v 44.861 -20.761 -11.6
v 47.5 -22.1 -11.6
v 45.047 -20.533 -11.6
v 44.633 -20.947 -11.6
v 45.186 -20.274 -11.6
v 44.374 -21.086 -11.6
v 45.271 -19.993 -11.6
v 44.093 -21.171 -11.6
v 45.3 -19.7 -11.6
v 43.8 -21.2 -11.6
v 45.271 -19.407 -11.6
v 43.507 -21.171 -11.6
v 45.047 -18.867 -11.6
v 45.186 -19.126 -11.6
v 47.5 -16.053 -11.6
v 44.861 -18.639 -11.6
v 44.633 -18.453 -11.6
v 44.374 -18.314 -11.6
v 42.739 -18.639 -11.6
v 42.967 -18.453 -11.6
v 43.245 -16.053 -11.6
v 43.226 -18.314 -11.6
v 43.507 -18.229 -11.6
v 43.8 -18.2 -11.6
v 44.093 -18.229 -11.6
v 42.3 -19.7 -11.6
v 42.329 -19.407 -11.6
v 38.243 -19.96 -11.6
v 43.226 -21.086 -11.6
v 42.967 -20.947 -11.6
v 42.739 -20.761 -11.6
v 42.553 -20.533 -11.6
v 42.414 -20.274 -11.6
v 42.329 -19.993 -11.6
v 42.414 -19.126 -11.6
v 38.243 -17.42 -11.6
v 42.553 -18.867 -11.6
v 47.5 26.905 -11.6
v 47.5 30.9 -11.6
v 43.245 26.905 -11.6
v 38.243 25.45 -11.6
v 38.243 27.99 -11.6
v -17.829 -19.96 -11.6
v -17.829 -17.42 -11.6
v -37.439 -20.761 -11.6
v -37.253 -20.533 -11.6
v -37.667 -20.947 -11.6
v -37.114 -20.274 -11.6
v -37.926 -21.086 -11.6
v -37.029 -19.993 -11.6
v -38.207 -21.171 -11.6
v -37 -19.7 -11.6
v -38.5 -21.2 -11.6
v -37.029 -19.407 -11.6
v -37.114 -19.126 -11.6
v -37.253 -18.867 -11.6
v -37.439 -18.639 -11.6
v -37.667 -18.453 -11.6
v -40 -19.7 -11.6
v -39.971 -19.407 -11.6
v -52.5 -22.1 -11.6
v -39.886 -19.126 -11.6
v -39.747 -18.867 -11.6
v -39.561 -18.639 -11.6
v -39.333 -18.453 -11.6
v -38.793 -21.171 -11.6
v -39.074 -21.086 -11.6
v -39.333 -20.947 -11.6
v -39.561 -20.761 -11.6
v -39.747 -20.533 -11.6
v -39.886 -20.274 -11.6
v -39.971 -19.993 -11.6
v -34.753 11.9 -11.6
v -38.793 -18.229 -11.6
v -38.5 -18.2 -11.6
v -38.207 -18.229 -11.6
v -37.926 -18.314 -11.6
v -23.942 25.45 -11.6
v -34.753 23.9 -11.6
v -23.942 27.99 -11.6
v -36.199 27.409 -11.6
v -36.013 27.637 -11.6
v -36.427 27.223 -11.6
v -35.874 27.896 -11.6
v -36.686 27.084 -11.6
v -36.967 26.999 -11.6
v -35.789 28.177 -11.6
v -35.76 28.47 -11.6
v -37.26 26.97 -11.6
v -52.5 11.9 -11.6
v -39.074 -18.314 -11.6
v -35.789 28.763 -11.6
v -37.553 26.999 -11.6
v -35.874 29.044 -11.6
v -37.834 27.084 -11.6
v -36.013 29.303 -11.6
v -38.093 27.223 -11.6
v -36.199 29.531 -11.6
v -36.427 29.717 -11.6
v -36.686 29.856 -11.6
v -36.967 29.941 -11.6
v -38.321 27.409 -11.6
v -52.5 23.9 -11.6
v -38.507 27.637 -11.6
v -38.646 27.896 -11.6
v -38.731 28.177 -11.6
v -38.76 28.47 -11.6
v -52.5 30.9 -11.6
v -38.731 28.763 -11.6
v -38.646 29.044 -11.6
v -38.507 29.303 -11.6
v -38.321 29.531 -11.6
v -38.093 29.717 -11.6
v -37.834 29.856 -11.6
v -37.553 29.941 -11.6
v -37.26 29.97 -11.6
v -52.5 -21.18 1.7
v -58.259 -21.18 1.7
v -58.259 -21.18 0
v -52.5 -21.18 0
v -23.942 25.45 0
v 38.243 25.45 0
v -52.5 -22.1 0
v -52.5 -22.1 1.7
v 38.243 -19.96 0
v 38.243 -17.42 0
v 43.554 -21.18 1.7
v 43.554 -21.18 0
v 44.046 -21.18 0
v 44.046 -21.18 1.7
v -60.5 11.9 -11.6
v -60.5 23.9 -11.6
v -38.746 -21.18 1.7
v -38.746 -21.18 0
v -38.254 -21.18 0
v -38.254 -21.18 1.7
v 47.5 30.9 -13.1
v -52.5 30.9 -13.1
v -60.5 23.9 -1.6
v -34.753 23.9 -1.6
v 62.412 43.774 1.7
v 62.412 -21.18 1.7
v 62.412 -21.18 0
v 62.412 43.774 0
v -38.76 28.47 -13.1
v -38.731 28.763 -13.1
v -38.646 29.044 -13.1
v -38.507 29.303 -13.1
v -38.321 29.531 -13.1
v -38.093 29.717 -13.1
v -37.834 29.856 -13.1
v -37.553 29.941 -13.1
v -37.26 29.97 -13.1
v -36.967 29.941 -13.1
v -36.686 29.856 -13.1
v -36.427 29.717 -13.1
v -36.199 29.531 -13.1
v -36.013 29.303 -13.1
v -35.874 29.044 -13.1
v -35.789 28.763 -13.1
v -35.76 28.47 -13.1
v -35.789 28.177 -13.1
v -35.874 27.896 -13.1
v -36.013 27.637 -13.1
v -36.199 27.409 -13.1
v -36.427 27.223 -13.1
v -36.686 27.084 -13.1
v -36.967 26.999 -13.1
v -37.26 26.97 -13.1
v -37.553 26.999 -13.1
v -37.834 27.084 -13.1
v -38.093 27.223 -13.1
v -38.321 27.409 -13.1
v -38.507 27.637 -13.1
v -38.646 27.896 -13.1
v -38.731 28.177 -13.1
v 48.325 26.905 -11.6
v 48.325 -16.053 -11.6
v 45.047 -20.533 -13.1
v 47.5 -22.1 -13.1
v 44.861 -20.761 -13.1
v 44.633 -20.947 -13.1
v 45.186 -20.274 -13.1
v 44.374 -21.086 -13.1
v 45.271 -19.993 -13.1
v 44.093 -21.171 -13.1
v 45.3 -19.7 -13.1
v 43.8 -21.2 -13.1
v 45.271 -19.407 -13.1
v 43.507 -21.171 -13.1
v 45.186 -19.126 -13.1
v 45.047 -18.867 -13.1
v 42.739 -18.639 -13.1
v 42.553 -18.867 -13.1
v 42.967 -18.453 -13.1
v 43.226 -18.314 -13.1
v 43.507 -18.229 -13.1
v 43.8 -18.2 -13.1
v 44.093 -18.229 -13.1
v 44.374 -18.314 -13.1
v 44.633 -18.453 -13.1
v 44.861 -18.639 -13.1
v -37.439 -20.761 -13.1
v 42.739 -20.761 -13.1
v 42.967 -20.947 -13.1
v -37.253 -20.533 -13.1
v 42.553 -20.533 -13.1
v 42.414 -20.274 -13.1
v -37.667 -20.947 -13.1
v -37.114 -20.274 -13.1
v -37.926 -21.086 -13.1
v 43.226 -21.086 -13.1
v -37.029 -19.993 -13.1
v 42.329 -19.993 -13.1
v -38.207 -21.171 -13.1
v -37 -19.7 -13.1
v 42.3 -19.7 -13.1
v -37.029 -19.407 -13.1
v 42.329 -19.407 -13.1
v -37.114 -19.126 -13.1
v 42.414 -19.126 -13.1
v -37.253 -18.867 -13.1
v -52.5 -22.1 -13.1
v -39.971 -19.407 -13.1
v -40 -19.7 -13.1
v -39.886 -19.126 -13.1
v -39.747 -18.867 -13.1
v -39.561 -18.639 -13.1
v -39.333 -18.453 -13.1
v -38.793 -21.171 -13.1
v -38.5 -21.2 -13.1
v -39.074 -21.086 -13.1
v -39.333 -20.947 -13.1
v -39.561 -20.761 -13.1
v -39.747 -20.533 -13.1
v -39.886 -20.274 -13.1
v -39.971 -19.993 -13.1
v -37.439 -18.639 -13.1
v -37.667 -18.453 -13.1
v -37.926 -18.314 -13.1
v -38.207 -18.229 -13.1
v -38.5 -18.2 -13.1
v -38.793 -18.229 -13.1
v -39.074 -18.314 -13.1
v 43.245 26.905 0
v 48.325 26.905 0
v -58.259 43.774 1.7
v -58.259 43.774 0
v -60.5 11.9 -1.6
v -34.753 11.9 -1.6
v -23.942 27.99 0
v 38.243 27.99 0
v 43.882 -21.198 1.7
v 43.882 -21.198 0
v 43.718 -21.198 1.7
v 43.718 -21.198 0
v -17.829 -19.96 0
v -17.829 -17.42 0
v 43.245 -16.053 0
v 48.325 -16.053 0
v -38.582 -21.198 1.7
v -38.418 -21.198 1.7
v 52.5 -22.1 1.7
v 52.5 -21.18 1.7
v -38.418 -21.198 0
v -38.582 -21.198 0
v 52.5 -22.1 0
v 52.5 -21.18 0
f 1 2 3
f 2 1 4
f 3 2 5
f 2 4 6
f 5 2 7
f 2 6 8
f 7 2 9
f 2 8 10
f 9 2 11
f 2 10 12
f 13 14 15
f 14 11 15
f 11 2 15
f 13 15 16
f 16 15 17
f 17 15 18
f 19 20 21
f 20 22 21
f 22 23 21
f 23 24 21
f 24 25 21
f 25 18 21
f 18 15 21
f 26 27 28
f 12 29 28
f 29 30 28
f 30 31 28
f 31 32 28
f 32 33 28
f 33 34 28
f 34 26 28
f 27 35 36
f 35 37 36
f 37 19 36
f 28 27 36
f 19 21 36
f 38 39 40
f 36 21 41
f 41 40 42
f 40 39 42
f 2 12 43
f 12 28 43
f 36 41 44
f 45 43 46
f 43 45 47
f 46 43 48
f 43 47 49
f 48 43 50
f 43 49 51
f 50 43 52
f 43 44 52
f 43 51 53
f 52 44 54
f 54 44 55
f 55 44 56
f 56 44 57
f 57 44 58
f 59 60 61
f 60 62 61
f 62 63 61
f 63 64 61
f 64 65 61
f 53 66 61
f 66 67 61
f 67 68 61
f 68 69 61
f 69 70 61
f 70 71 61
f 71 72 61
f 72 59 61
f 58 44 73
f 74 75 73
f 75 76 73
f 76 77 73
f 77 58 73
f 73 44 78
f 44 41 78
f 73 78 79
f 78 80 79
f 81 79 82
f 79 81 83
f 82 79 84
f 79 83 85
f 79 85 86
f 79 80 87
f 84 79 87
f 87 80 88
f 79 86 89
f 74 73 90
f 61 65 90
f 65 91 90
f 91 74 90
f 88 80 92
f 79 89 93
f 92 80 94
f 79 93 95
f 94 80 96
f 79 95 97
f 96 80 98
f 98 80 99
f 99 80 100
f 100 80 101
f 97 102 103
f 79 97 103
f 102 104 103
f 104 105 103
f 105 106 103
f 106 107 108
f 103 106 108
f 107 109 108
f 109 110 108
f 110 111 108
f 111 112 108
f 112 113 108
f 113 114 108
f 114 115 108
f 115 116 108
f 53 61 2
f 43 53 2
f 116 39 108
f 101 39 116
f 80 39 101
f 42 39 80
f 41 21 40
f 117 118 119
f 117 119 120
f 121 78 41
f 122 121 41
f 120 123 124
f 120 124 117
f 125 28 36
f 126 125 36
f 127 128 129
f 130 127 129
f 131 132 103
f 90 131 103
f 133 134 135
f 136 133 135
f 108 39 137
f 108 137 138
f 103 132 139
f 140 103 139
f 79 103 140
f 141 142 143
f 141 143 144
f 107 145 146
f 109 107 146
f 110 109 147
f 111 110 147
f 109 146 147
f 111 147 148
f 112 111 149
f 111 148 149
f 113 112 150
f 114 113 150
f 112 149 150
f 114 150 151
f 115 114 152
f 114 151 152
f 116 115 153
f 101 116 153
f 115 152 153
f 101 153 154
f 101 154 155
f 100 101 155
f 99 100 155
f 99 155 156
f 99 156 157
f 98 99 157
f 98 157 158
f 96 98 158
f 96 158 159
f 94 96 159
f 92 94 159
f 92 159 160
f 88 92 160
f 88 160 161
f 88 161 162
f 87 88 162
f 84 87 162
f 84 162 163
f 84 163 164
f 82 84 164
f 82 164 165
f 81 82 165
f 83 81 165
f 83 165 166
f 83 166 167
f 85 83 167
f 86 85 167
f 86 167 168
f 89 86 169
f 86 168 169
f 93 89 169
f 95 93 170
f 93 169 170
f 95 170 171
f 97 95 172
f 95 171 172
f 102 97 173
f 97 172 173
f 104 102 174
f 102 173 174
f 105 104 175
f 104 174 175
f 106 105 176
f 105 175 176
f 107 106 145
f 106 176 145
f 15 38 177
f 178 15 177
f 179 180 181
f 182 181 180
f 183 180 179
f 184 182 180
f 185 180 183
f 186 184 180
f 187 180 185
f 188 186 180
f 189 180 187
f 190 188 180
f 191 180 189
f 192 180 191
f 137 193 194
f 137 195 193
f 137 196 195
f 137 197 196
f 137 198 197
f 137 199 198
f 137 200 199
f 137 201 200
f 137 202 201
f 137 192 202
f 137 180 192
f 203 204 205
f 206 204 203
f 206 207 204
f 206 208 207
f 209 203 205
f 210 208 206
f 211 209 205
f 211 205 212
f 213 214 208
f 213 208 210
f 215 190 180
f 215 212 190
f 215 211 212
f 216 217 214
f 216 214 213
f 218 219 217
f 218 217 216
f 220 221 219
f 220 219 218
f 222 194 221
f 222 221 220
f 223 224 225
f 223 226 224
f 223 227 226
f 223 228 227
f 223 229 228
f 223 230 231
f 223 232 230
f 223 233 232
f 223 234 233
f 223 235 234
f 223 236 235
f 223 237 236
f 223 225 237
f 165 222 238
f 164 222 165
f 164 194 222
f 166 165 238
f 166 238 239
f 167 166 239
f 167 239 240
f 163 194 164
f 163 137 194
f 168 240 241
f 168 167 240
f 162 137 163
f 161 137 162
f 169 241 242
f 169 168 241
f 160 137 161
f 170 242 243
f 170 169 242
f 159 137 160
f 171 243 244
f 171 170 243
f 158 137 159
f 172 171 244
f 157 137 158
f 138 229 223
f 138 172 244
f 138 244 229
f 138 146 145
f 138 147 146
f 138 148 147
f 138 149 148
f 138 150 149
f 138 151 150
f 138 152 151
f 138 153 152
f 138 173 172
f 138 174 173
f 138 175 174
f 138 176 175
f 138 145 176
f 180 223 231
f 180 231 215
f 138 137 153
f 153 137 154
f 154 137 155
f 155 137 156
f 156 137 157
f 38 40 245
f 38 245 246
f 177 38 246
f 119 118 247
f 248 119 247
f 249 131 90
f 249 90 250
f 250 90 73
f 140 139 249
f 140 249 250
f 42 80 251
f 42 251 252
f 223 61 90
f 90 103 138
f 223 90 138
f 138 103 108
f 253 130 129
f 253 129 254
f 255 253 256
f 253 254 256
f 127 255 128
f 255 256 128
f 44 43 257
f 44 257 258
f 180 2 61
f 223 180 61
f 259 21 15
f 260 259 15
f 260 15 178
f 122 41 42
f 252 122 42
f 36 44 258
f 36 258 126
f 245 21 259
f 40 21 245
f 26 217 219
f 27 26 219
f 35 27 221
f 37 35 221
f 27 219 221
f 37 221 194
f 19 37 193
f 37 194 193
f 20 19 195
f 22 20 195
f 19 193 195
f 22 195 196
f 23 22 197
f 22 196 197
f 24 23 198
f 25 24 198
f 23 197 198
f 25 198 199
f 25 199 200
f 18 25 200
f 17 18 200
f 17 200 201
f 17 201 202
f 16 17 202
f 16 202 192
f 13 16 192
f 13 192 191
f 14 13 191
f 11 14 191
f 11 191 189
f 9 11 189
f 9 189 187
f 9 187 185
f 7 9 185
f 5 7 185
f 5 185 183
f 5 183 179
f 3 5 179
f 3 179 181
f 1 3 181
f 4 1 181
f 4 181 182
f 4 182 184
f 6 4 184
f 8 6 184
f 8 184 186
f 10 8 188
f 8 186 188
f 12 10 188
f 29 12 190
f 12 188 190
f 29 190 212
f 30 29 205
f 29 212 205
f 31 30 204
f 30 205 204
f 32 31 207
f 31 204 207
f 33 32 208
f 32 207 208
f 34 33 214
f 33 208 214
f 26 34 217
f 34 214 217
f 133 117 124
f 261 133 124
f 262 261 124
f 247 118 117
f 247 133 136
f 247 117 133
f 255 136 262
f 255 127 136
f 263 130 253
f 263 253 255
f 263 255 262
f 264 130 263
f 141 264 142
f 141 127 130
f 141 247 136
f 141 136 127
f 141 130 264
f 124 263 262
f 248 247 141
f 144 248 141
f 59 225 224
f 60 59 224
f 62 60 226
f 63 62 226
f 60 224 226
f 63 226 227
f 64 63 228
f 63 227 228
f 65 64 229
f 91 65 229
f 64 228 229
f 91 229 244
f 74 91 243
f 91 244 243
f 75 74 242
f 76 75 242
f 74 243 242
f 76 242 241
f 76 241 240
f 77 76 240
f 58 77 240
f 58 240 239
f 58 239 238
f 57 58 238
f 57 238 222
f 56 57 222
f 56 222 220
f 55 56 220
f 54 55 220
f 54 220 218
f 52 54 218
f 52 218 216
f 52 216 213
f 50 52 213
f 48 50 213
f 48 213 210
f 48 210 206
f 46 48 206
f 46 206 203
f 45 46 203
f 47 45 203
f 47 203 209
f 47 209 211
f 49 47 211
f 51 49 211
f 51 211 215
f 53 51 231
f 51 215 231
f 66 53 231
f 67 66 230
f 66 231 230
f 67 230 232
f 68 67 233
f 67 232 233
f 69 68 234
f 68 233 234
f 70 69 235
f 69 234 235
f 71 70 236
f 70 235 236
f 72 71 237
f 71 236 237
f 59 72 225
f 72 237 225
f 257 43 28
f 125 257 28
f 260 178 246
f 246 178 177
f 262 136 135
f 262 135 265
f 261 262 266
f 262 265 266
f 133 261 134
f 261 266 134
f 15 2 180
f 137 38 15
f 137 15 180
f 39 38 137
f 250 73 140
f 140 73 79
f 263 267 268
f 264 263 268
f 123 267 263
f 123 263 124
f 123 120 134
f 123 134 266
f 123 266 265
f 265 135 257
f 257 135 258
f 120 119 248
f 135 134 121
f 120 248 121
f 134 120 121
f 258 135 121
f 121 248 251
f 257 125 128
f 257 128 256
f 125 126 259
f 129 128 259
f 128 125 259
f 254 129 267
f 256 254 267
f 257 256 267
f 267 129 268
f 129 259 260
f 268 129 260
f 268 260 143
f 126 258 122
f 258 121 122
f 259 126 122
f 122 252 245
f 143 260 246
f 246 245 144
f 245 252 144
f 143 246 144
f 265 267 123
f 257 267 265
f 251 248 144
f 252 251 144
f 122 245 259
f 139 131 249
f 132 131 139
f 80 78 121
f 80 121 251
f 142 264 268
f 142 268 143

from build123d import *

# Parameters (mm, degrees)
ESBO_O1_W                 = 105
ESBO_O1_H                 = 60
RESSALTO_EXTRUS_O1_DEPTH  = 1.7
RESSALTO_EXTRUS_O6_START  = 11.6
ESBO_O3_W                 = 100
ESBO_O3_H                 = 53
RESSALTO_EXTRUS_O6_DEPTH  = 1.5
ESBO_O4_W                 = 62.184169383
ESBO_O4_H                 = 2.54
ESBO_O4_W_2               = 5.08
ESBO_O4_H_2               = 42.957805244
ESBO_O4_W_3               = 56.07185462
RESSALTO_EXTRUS_O8_DEPTH  = 11.6
ESBO_O7_W                 = 25.746964405
ESBO_O7_H                 = 12
RESSALTO_EXTRUS_O10_DEPTH = 10
ESBO_O8_R                 = 1.5
ESBO_O8_W                 = 105
ESBO_O8_H                 = 7.9
CORTE_EXTRUS_O1_DEPTH     = 15.8
ESBO_O9_W                 = 120.671020404
ESBO_O9_H                 = 64.953228707
RESSALTO_EXTRUS_O11_DEPTH = 1.7


with BuildPart() as part:
    # Esboço1 → Ressalto-extrusão1 (new body)
    with BuildSketch(Plane.XY):
        Rectangle(ESBO_O1_W, ESBO_O1_H)
    extrude(amount=RESSALTO_EXTRUS_O1_DEPTH)



with BuildPart() as body_2:
    # Esboço3 → Ressalto-extrusão6 (new body)
    with BuildSketch(Plane(origin=(0, 0, 0), x_dir=(-1, 0, 0), z_dir=(0, 0, -1)).offset(RESSALTO_EXTRUS_O6_START)):
        with Locations((2.5, 4.4)):
            Rectangle(ESBO_O3_W, ESBO_O3_H)
    extrude(amount=RESSALTO_EXTRUS_O6_DEPTH)


with BuildPart() as part_1:
    add(part.part)

    add(body_2.part)  # Ressalto-extrusão8 merges body 2
    # Esboço4 → Ressalto-extrusão8 (add)
    with BuildSketch(Plane.XY.offset(-11.6)):
        with Locations((7.150543675, 26.719832293)):
            Rectangle(ESBO_O4_W, ESBO_O4_H)
        with Locations((45.784919315, 5.42627648)):
            Rectangle(ESBO_O4_W_2, ESBO_O4_H_2)
        with Locations((10.206701056, -18.689881399)):
            Rectangle(ESBO_O4_W_3, ESBO_O4_H)
    extrude(amount=RESSALTO_EXTRUS_O8_DEPTH)

    # Esboço7 → Ressalto-extrusão10 (add)
    with BuildSketch(Plane.XY.offset(-11.6)):
        with Locations((-47.626517798, 17.9)):
            Rectangle(ESBO_O7_W, ESBO_O7_H)
    extrude(amount=RESSALTO_EXTRUS_O10_DEPTH)

    # Esboço8 → Corte-extrusão1 (cut, through all)
    with BuildSketch(Plane(origin=(0, 0, -13.1), x_dir=(-1, 0, 0), z_dir=(0, 0, -1))):
        with Locations((37.26, 28.47)):
            Circle(ESBO_O8_R)
        with Locations((38.5, -19.7)):
            Circle(ESBO_O8_R)
        with Locations((-43.8, -19.7)):
            Circle(ESBO_O8_R)
        with Locations((0, -26.05)):
            Rectangle(ESBO_O8_W, ESBO_O8_H)
    extrude(amount=-CORTE_EXTRUS_O1_DEPTH, mode=Mode.SUBTRACT)

    # Esboço9 → Ressalto-extrusão11 (add)
    with BuildSketch(Plane.XY.offset(1.7)):
        with Locations((2.076306878, 11.29693703)):
            Rectangle(ESBO_O9_W, ESBO_O9_H)
    extrude(amount=-RESSALTO_EXTRUS_O11_DEPTH)


solid = part_1.part
